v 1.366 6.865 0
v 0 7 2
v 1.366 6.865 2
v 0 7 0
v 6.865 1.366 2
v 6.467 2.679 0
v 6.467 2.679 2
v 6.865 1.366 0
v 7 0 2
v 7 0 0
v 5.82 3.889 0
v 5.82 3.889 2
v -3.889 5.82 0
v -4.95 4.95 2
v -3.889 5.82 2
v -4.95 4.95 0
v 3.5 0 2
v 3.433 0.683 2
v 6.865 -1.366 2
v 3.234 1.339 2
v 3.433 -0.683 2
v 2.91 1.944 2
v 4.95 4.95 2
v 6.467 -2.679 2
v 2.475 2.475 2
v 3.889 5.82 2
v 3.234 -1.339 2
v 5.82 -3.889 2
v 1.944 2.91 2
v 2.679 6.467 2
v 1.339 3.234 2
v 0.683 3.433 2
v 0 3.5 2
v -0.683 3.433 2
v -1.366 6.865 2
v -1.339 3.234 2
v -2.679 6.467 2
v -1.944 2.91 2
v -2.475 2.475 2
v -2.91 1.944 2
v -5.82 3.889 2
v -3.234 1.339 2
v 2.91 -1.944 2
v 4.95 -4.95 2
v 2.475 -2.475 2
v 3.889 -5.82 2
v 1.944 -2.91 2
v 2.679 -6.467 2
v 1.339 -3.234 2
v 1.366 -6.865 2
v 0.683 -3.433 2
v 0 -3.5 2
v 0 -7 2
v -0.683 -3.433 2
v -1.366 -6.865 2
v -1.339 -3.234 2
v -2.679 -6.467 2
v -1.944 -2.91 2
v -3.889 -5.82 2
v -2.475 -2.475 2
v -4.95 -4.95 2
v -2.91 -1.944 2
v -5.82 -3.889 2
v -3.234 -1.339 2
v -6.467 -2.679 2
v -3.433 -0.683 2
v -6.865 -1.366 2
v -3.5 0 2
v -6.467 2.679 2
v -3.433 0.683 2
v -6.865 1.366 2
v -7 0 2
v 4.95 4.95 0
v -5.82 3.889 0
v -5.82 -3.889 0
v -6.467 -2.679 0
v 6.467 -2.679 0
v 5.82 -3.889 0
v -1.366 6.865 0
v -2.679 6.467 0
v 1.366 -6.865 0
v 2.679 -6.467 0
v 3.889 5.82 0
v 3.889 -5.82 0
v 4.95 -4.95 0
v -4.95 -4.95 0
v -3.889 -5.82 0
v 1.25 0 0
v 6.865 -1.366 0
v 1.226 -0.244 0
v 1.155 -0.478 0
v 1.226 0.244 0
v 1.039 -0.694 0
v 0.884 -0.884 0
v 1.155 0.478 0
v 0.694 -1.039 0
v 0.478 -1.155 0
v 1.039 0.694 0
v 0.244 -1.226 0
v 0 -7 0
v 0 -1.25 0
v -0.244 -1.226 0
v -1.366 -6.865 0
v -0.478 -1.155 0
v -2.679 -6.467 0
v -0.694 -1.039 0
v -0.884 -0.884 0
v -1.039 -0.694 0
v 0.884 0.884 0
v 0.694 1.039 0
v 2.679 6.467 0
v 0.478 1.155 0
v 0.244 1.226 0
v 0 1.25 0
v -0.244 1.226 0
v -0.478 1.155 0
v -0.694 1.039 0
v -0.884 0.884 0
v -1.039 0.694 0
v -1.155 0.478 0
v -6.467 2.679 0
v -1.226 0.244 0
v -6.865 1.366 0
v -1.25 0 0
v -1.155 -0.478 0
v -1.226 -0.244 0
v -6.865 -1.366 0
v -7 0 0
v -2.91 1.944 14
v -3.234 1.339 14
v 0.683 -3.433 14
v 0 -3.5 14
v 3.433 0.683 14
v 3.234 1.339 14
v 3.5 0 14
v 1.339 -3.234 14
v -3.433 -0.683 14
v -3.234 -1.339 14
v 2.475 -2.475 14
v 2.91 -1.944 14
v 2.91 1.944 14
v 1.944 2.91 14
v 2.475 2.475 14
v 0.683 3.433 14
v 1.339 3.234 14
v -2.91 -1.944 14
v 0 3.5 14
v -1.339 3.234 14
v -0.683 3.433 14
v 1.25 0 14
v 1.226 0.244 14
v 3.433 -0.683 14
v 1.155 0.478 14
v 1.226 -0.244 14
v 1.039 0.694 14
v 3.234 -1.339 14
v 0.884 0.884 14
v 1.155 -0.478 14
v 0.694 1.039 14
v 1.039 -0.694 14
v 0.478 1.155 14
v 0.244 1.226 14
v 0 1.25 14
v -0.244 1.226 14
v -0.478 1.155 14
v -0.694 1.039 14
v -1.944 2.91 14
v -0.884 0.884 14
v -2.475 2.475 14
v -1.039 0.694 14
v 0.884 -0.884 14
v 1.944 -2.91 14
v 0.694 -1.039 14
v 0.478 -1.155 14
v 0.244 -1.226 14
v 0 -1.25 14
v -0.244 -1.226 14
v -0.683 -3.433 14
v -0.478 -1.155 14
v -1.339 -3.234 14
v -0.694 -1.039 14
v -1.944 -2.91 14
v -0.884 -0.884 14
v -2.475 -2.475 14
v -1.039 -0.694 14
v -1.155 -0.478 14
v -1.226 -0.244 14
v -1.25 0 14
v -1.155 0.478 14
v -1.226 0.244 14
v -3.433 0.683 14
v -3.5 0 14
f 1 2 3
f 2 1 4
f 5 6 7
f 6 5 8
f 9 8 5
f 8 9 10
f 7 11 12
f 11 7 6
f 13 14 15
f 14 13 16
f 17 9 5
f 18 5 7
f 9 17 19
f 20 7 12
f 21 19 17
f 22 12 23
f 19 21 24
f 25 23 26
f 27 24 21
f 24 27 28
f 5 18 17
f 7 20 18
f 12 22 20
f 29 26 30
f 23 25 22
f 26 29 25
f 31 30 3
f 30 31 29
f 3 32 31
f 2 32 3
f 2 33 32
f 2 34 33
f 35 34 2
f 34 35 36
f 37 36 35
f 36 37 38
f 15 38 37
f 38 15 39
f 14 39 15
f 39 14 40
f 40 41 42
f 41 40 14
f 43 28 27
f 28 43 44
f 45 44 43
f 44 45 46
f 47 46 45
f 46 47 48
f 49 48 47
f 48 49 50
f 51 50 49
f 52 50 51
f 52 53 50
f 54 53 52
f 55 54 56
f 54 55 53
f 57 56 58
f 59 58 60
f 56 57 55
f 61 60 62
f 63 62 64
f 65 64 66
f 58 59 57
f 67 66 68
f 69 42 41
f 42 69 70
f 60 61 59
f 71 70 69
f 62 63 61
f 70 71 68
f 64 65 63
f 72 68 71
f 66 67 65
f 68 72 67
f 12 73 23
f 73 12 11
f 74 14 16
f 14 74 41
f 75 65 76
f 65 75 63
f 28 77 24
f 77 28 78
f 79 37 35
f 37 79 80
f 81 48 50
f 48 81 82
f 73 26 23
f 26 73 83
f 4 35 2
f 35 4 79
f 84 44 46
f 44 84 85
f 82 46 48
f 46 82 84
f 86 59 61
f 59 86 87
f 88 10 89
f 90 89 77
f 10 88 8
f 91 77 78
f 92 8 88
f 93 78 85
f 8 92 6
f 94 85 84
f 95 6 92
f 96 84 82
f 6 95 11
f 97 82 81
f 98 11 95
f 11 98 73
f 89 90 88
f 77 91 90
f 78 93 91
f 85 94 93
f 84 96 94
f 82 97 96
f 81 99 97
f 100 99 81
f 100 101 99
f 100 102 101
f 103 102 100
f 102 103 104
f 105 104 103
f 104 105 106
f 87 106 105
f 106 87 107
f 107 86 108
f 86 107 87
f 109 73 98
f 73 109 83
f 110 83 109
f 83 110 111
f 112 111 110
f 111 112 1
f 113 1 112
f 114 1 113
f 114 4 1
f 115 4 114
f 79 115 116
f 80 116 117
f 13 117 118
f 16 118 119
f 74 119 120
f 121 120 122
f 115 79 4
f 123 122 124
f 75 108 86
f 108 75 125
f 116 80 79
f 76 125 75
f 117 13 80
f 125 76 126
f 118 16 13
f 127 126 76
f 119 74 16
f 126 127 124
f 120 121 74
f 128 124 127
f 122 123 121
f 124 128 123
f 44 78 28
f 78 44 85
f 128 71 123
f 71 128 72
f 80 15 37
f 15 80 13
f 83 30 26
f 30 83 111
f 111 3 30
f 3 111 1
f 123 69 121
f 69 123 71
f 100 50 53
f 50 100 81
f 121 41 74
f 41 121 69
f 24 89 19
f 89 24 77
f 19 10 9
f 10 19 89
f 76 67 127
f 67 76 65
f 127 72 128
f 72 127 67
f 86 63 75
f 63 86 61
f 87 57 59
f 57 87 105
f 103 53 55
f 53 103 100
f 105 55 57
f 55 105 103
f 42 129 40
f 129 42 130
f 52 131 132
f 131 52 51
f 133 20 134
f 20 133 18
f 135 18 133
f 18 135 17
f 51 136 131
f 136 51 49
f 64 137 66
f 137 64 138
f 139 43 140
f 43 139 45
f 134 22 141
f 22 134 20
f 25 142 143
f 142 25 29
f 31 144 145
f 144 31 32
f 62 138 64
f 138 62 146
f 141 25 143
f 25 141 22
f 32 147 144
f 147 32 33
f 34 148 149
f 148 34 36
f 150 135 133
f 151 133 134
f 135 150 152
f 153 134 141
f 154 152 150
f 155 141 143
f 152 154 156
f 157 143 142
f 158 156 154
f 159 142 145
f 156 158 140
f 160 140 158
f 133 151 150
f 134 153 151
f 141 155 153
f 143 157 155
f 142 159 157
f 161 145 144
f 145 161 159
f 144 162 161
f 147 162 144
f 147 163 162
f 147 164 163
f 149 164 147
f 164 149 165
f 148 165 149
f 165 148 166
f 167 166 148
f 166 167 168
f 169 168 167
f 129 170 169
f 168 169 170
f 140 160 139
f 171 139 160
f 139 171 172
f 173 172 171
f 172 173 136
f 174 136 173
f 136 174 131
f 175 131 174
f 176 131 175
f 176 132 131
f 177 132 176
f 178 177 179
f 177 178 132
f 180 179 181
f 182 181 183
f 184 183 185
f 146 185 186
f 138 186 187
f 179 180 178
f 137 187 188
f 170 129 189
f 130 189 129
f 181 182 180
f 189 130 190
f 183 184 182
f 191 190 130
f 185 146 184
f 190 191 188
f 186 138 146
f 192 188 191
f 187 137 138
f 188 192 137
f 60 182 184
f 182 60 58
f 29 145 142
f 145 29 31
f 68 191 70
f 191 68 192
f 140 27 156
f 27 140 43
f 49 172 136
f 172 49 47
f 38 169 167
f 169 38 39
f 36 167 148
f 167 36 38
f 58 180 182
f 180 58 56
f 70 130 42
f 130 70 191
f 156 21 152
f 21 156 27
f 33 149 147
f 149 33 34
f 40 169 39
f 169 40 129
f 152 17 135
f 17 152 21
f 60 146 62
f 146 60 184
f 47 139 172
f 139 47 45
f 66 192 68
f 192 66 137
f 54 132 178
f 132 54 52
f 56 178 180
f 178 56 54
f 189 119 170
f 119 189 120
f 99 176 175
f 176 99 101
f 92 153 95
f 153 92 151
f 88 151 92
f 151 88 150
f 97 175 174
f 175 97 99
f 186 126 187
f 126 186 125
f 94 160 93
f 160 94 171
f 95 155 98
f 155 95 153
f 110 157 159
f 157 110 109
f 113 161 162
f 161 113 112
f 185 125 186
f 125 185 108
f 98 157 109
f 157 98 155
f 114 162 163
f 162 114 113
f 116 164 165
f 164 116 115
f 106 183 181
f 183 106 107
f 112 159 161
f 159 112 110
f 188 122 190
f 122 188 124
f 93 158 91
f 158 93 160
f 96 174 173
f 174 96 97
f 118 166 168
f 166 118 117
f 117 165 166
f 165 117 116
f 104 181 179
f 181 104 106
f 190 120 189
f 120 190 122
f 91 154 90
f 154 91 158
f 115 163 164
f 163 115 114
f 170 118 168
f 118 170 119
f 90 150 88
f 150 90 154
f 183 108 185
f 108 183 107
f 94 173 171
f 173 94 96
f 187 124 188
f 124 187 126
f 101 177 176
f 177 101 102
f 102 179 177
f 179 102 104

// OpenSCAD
$fn = 32;

// ----------------------------------------------------------------------
// Micro post: flanged post, 5-20 mm class
// ----------------------------------------------------------------------

// --- parameters (mm) ---
post_d = 7;               // post diameter
post_h = 12;              // post height above the flange
flange_d = 14;            // flange diameter
flange_t = 2;             // flange thickness
bore_d = 2.5;             // through bore

total_h = post_h + flange_t;  // overall height

difference() {
  union() {
    cylinder(h = flange_t, d = flange_d);
    translate([0, 0, flange_t]) cylinder(h = post_h, d = post_d);
  }
  translate([0, 0, -1]) cylinder(h = total_h + 2, d = bore_d);
}
